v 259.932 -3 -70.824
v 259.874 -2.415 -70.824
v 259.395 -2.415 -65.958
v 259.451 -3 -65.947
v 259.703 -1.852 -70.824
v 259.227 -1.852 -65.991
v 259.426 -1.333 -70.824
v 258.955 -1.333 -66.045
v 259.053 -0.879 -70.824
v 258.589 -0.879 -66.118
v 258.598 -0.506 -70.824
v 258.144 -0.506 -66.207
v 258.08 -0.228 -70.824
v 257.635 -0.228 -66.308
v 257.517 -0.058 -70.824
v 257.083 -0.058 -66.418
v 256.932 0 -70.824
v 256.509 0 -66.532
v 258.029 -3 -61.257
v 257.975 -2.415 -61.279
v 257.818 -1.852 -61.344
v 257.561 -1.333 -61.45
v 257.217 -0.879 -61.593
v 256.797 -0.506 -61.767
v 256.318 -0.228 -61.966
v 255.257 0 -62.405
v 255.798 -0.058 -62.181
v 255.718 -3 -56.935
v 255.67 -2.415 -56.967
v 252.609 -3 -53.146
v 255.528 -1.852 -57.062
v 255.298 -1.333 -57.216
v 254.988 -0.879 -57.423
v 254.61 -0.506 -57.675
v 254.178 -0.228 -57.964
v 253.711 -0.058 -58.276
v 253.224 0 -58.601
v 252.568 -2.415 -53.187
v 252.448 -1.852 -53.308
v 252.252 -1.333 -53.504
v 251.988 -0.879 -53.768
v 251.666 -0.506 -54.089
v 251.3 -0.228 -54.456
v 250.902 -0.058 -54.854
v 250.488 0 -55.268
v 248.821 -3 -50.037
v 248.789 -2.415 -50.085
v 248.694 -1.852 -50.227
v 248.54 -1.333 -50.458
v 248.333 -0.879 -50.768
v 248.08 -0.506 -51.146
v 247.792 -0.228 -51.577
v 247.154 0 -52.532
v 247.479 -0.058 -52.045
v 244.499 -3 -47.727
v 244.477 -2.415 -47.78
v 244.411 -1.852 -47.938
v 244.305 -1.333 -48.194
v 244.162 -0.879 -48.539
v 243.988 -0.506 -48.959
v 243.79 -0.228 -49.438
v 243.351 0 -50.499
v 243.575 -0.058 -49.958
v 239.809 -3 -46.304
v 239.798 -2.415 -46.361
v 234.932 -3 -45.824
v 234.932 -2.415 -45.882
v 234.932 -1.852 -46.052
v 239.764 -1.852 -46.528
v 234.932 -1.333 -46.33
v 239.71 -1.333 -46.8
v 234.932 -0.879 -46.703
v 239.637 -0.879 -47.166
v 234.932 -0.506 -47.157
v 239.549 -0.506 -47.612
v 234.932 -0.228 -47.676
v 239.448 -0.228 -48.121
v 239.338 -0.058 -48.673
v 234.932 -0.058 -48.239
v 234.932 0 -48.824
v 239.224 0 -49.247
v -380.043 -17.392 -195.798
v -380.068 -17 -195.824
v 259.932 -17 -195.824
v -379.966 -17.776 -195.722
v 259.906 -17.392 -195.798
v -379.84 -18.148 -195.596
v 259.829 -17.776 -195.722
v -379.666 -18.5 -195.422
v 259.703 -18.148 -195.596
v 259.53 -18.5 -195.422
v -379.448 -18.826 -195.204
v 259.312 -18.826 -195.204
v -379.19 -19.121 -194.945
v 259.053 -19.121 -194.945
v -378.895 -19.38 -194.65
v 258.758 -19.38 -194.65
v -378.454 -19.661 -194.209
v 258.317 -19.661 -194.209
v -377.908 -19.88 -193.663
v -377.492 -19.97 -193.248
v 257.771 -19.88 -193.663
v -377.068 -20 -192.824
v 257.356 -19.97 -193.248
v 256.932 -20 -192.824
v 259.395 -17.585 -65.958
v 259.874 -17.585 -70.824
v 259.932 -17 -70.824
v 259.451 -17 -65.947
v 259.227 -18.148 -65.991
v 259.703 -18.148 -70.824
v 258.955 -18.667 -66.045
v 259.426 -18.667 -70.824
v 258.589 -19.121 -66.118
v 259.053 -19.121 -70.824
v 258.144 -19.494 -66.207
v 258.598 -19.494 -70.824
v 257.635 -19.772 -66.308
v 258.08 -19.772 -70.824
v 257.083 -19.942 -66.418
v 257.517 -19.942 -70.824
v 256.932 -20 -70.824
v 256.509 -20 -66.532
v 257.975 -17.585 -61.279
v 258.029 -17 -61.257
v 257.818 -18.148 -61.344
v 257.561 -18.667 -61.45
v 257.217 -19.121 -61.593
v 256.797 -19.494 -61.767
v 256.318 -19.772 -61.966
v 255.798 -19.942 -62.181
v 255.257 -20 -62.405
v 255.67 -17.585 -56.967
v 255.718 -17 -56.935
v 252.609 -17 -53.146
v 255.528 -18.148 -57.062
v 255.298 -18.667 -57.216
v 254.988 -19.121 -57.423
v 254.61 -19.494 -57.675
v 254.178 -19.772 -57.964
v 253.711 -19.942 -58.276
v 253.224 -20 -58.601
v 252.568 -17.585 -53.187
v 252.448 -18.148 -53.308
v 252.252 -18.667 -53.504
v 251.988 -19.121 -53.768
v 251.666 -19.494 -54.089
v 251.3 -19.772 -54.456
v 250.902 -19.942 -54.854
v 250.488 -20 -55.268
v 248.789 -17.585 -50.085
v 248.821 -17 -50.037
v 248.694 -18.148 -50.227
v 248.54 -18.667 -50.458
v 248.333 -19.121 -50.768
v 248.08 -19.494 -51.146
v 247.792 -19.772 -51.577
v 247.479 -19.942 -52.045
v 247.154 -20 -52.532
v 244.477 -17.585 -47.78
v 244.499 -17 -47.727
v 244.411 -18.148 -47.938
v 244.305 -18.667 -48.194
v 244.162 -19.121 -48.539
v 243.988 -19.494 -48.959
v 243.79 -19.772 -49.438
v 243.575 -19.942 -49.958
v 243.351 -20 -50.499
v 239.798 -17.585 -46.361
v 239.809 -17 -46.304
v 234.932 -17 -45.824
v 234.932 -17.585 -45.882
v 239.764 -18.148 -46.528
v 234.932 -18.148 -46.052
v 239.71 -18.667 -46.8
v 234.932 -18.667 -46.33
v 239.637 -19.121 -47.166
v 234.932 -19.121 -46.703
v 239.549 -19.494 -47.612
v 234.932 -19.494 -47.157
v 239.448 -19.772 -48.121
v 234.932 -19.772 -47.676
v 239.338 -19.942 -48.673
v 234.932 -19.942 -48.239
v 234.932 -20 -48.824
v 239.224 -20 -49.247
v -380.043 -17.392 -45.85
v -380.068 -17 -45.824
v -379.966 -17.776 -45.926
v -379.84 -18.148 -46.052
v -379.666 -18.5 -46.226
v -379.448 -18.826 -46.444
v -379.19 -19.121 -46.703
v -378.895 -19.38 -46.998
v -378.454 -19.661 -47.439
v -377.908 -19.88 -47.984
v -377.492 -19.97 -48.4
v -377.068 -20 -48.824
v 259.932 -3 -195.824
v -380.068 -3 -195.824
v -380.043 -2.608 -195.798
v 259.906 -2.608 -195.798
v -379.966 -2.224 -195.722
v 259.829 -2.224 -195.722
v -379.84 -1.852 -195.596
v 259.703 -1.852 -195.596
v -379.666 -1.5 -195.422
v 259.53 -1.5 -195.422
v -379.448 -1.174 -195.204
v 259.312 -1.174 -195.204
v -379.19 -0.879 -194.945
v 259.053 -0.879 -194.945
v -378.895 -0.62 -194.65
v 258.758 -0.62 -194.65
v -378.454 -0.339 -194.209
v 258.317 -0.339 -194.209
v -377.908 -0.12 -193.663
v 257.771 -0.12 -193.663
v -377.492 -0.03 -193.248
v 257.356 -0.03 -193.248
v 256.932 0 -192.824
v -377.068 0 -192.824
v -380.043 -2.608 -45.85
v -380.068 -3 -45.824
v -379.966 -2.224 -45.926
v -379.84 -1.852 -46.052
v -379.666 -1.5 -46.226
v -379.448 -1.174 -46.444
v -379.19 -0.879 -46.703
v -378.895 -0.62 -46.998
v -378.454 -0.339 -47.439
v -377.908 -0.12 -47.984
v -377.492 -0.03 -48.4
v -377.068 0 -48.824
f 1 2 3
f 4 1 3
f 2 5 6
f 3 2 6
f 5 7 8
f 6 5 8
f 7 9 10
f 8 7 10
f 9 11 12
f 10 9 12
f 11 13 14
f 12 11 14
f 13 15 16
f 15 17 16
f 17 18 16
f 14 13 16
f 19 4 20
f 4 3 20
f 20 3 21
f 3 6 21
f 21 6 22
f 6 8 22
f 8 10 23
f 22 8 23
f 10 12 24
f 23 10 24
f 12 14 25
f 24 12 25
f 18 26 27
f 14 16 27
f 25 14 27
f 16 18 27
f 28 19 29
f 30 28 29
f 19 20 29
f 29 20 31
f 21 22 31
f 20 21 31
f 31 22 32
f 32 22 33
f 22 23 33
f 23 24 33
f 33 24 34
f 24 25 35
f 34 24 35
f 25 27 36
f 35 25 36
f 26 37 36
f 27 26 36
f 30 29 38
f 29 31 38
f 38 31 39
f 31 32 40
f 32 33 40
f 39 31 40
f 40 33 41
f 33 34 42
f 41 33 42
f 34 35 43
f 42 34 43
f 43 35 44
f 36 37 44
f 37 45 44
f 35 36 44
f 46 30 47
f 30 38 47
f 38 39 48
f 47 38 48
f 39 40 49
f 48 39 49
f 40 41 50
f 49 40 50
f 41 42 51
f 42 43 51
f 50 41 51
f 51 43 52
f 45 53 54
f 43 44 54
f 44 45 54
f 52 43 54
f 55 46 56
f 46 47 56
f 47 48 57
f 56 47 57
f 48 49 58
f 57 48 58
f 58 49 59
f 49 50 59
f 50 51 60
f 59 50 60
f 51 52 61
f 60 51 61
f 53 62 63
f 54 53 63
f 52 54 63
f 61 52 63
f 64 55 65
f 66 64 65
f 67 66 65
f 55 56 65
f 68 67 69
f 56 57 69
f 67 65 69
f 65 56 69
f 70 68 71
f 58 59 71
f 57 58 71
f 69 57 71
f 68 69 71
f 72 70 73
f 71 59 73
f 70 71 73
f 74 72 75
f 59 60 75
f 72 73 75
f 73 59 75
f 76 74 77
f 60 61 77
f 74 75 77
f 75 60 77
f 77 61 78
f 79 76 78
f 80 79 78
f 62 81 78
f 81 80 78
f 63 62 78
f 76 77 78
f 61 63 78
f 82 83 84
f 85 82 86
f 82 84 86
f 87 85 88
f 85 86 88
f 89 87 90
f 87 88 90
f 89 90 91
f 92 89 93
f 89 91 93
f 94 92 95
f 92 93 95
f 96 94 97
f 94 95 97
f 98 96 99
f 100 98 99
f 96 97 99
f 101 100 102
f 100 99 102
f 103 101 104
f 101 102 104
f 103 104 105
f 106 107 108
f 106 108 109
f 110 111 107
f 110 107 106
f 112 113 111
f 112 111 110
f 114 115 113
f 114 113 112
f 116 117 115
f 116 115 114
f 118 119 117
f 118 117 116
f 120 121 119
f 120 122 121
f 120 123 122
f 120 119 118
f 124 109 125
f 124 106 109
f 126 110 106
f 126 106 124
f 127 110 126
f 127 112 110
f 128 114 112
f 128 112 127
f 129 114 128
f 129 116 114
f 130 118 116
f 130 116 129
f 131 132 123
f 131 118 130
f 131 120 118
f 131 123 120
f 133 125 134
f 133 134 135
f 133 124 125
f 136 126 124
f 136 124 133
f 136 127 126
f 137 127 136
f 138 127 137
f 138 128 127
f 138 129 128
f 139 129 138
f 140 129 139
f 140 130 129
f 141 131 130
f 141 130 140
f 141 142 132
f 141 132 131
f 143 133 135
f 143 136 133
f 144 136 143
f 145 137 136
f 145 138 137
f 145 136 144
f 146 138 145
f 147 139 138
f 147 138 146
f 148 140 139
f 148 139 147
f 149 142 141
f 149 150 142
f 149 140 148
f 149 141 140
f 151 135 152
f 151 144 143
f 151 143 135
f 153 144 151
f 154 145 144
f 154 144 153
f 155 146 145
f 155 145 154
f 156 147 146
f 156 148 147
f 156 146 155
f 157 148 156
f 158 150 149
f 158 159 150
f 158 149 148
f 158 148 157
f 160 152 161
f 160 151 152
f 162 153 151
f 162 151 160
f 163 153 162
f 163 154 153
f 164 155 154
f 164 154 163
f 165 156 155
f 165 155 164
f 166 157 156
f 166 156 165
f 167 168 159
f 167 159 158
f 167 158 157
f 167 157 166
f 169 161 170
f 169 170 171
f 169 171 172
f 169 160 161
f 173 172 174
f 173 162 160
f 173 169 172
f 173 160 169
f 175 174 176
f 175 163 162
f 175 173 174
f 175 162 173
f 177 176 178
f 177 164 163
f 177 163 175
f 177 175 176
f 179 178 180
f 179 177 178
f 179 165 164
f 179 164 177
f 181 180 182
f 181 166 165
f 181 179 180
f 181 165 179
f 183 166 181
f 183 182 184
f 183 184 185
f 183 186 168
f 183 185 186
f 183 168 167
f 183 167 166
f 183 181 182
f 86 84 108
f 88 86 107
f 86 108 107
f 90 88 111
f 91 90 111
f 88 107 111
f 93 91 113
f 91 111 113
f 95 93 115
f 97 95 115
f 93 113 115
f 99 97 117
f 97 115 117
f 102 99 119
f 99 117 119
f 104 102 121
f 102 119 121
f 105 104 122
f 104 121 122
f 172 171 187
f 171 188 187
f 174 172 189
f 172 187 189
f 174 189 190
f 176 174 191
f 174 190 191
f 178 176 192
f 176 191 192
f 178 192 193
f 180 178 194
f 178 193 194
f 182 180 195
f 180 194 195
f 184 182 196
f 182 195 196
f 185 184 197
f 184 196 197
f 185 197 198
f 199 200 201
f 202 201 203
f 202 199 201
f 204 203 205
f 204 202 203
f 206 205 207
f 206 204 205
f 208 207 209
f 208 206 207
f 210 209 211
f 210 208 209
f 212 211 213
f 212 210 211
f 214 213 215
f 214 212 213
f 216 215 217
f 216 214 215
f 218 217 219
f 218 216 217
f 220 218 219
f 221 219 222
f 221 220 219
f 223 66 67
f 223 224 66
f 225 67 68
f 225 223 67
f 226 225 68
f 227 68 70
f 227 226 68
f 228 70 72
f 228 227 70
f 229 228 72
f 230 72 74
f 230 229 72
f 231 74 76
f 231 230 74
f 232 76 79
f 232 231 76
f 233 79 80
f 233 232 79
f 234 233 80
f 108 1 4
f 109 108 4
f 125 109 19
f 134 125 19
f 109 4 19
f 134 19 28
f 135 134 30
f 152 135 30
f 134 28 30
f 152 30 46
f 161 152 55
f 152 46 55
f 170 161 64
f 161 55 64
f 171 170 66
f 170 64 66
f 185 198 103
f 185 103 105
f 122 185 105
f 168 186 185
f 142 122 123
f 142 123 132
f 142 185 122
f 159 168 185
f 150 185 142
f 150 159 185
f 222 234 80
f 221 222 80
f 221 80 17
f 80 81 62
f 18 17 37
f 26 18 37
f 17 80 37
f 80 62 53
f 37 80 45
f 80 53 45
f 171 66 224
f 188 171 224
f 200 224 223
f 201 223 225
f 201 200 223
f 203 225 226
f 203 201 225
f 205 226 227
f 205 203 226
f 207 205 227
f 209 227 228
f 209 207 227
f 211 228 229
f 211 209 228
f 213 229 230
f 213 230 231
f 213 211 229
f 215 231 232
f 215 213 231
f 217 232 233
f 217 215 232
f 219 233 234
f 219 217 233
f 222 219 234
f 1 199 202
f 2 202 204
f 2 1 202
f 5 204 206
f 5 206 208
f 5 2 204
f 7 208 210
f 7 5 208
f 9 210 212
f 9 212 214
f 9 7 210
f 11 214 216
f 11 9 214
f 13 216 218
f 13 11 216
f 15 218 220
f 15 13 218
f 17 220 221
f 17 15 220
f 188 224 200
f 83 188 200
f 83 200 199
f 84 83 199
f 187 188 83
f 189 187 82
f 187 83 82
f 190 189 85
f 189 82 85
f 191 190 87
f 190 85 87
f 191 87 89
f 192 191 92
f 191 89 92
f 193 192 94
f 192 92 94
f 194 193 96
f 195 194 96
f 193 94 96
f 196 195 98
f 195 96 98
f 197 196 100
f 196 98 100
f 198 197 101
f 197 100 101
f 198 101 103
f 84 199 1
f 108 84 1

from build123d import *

# Parameters (mm, degrees)
F1_DEPTH = 20
F3_R     = 3


with BuildPart() as f1:
    # F0 (on Front) → F1 (new body)
    with BuildSketch(Plane.XZ):
        with BuildLine():
            Line((234.931585, -45.82393), (-380.068415, -45.82393))
            Line((-380.068415, -45.82393), (-380.068415, -195.82393))
            Line((-380.068415, -195.82393), (259.931585, -195.82393))
            Line((259.931585, -195.82393), (259.931585, -70.82393))
            ThreePointArc((259.931585, -70.82393), (252.609255, -53.14626), (234.931585, -45.82393))
        make_face()
    extrude(amount=F1_DEPTH)

    # F3
    f3_edges = [f1.edges().sort_by_distance(p)[0] for p in [
        (259.931585, 0, -133.32393),
        (252.609255, 0, -53.14626),
        (-72.568415, 0, -45.82393),
        (-380.068415, 0, -120.82393),
        (-60.068415, 0, -195.82393),
        (259.931585, -20, -133.32393),
        (252.609255, -20, -53.14626),
        (-72.568415, -20, -45.82393),
        (-380.068415, -20, -120.82393),
        (-60.068415, -20, -195.82393),
    ]]
    fillet(f3_edges, radius=F3_R)


solid = f1.part
